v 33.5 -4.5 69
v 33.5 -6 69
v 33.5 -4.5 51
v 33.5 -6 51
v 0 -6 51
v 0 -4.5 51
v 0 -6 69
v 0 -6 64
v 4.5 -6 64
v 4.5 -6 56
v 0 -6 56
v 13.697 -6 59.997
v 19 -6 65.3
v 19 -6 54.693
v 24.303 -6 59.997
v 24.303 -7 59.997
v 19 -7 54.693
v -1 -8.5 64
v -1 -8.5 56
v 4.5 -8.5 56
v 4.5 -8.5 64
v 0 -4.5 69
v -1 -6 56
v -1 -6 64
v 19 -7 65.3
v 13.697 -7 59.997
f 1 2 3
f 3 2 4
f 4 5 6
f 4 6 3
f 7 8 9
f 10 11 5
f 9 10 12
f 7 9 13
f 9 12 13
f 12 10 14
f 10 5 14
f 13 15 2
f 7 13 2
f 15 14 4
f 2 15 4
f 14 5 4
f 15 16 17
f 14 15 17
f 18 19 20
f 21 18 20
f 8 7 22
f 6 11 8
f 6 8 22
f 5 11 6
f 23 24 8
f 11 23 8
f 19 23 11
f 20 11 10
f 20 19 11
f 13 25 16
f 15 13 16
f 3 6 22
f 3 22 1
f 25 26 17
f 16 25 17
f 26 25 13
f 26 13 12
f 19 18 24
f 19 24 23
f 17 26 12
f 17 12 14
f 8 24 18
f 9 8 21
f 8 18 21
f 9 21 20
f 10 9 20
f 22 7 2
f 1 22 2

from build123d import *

# Parameters (mm, degrees)
SKETCH005_W             = 33.5
SKETCH005_H             = 18
PAD006_DEPTH            = 1.5
BOX013_W                = 5.5
BOX013_H                = 8
BOX013_DEPTH            = 2.5
BOX014_W                = 7.5
BOX014_H                = 7.5
BOX014_DEPTH            = 1
BODY008_PLACEMENT_ANGLE = 180


with BuildPart() as part:
    # Sketch005 → Pad006 (new body)
    with BuildSketch(Plane.XZ):
        with Locations((16.75, 9)):
            Rectangle(SKETCH005_W, SKETCH005_H)
    extrude(amount=PAD006_DEPTH)

    # Box013 → Box013 (join)
    with BuildSketch(Plane(origin=(-1, 2.5, 5), x_dir=(1, 0, 0), z_dir=(0, -1, 0))):
        with Locations((2.75, 4)):
            Rectangle(BOX013_W, BOX013_H)
    extrude(amount=BOX013_DEPTH)

    # Box014 → Box014 (join)
    with BuildSketch(Plane(origin=(19, 1, 3.7), x_dir=(0.707107, 0, 0.707107), z_dir=(0, -1, 0))):
        with Locations((3.75, 3.75)):
            Rectangle(BOX014_W, BOX014_H)
    extrude(amount=BOX014_DEPTH)


with BuildPart() as part_1:
    # Body008 placement: moved
    add(part.part.moved(Location((0, -6, 69))).rotate(Axis((0, -6, 69), (1, 0, 0)), BODY008_PLACEMENT_ANGLE))


solid = part_1.part
